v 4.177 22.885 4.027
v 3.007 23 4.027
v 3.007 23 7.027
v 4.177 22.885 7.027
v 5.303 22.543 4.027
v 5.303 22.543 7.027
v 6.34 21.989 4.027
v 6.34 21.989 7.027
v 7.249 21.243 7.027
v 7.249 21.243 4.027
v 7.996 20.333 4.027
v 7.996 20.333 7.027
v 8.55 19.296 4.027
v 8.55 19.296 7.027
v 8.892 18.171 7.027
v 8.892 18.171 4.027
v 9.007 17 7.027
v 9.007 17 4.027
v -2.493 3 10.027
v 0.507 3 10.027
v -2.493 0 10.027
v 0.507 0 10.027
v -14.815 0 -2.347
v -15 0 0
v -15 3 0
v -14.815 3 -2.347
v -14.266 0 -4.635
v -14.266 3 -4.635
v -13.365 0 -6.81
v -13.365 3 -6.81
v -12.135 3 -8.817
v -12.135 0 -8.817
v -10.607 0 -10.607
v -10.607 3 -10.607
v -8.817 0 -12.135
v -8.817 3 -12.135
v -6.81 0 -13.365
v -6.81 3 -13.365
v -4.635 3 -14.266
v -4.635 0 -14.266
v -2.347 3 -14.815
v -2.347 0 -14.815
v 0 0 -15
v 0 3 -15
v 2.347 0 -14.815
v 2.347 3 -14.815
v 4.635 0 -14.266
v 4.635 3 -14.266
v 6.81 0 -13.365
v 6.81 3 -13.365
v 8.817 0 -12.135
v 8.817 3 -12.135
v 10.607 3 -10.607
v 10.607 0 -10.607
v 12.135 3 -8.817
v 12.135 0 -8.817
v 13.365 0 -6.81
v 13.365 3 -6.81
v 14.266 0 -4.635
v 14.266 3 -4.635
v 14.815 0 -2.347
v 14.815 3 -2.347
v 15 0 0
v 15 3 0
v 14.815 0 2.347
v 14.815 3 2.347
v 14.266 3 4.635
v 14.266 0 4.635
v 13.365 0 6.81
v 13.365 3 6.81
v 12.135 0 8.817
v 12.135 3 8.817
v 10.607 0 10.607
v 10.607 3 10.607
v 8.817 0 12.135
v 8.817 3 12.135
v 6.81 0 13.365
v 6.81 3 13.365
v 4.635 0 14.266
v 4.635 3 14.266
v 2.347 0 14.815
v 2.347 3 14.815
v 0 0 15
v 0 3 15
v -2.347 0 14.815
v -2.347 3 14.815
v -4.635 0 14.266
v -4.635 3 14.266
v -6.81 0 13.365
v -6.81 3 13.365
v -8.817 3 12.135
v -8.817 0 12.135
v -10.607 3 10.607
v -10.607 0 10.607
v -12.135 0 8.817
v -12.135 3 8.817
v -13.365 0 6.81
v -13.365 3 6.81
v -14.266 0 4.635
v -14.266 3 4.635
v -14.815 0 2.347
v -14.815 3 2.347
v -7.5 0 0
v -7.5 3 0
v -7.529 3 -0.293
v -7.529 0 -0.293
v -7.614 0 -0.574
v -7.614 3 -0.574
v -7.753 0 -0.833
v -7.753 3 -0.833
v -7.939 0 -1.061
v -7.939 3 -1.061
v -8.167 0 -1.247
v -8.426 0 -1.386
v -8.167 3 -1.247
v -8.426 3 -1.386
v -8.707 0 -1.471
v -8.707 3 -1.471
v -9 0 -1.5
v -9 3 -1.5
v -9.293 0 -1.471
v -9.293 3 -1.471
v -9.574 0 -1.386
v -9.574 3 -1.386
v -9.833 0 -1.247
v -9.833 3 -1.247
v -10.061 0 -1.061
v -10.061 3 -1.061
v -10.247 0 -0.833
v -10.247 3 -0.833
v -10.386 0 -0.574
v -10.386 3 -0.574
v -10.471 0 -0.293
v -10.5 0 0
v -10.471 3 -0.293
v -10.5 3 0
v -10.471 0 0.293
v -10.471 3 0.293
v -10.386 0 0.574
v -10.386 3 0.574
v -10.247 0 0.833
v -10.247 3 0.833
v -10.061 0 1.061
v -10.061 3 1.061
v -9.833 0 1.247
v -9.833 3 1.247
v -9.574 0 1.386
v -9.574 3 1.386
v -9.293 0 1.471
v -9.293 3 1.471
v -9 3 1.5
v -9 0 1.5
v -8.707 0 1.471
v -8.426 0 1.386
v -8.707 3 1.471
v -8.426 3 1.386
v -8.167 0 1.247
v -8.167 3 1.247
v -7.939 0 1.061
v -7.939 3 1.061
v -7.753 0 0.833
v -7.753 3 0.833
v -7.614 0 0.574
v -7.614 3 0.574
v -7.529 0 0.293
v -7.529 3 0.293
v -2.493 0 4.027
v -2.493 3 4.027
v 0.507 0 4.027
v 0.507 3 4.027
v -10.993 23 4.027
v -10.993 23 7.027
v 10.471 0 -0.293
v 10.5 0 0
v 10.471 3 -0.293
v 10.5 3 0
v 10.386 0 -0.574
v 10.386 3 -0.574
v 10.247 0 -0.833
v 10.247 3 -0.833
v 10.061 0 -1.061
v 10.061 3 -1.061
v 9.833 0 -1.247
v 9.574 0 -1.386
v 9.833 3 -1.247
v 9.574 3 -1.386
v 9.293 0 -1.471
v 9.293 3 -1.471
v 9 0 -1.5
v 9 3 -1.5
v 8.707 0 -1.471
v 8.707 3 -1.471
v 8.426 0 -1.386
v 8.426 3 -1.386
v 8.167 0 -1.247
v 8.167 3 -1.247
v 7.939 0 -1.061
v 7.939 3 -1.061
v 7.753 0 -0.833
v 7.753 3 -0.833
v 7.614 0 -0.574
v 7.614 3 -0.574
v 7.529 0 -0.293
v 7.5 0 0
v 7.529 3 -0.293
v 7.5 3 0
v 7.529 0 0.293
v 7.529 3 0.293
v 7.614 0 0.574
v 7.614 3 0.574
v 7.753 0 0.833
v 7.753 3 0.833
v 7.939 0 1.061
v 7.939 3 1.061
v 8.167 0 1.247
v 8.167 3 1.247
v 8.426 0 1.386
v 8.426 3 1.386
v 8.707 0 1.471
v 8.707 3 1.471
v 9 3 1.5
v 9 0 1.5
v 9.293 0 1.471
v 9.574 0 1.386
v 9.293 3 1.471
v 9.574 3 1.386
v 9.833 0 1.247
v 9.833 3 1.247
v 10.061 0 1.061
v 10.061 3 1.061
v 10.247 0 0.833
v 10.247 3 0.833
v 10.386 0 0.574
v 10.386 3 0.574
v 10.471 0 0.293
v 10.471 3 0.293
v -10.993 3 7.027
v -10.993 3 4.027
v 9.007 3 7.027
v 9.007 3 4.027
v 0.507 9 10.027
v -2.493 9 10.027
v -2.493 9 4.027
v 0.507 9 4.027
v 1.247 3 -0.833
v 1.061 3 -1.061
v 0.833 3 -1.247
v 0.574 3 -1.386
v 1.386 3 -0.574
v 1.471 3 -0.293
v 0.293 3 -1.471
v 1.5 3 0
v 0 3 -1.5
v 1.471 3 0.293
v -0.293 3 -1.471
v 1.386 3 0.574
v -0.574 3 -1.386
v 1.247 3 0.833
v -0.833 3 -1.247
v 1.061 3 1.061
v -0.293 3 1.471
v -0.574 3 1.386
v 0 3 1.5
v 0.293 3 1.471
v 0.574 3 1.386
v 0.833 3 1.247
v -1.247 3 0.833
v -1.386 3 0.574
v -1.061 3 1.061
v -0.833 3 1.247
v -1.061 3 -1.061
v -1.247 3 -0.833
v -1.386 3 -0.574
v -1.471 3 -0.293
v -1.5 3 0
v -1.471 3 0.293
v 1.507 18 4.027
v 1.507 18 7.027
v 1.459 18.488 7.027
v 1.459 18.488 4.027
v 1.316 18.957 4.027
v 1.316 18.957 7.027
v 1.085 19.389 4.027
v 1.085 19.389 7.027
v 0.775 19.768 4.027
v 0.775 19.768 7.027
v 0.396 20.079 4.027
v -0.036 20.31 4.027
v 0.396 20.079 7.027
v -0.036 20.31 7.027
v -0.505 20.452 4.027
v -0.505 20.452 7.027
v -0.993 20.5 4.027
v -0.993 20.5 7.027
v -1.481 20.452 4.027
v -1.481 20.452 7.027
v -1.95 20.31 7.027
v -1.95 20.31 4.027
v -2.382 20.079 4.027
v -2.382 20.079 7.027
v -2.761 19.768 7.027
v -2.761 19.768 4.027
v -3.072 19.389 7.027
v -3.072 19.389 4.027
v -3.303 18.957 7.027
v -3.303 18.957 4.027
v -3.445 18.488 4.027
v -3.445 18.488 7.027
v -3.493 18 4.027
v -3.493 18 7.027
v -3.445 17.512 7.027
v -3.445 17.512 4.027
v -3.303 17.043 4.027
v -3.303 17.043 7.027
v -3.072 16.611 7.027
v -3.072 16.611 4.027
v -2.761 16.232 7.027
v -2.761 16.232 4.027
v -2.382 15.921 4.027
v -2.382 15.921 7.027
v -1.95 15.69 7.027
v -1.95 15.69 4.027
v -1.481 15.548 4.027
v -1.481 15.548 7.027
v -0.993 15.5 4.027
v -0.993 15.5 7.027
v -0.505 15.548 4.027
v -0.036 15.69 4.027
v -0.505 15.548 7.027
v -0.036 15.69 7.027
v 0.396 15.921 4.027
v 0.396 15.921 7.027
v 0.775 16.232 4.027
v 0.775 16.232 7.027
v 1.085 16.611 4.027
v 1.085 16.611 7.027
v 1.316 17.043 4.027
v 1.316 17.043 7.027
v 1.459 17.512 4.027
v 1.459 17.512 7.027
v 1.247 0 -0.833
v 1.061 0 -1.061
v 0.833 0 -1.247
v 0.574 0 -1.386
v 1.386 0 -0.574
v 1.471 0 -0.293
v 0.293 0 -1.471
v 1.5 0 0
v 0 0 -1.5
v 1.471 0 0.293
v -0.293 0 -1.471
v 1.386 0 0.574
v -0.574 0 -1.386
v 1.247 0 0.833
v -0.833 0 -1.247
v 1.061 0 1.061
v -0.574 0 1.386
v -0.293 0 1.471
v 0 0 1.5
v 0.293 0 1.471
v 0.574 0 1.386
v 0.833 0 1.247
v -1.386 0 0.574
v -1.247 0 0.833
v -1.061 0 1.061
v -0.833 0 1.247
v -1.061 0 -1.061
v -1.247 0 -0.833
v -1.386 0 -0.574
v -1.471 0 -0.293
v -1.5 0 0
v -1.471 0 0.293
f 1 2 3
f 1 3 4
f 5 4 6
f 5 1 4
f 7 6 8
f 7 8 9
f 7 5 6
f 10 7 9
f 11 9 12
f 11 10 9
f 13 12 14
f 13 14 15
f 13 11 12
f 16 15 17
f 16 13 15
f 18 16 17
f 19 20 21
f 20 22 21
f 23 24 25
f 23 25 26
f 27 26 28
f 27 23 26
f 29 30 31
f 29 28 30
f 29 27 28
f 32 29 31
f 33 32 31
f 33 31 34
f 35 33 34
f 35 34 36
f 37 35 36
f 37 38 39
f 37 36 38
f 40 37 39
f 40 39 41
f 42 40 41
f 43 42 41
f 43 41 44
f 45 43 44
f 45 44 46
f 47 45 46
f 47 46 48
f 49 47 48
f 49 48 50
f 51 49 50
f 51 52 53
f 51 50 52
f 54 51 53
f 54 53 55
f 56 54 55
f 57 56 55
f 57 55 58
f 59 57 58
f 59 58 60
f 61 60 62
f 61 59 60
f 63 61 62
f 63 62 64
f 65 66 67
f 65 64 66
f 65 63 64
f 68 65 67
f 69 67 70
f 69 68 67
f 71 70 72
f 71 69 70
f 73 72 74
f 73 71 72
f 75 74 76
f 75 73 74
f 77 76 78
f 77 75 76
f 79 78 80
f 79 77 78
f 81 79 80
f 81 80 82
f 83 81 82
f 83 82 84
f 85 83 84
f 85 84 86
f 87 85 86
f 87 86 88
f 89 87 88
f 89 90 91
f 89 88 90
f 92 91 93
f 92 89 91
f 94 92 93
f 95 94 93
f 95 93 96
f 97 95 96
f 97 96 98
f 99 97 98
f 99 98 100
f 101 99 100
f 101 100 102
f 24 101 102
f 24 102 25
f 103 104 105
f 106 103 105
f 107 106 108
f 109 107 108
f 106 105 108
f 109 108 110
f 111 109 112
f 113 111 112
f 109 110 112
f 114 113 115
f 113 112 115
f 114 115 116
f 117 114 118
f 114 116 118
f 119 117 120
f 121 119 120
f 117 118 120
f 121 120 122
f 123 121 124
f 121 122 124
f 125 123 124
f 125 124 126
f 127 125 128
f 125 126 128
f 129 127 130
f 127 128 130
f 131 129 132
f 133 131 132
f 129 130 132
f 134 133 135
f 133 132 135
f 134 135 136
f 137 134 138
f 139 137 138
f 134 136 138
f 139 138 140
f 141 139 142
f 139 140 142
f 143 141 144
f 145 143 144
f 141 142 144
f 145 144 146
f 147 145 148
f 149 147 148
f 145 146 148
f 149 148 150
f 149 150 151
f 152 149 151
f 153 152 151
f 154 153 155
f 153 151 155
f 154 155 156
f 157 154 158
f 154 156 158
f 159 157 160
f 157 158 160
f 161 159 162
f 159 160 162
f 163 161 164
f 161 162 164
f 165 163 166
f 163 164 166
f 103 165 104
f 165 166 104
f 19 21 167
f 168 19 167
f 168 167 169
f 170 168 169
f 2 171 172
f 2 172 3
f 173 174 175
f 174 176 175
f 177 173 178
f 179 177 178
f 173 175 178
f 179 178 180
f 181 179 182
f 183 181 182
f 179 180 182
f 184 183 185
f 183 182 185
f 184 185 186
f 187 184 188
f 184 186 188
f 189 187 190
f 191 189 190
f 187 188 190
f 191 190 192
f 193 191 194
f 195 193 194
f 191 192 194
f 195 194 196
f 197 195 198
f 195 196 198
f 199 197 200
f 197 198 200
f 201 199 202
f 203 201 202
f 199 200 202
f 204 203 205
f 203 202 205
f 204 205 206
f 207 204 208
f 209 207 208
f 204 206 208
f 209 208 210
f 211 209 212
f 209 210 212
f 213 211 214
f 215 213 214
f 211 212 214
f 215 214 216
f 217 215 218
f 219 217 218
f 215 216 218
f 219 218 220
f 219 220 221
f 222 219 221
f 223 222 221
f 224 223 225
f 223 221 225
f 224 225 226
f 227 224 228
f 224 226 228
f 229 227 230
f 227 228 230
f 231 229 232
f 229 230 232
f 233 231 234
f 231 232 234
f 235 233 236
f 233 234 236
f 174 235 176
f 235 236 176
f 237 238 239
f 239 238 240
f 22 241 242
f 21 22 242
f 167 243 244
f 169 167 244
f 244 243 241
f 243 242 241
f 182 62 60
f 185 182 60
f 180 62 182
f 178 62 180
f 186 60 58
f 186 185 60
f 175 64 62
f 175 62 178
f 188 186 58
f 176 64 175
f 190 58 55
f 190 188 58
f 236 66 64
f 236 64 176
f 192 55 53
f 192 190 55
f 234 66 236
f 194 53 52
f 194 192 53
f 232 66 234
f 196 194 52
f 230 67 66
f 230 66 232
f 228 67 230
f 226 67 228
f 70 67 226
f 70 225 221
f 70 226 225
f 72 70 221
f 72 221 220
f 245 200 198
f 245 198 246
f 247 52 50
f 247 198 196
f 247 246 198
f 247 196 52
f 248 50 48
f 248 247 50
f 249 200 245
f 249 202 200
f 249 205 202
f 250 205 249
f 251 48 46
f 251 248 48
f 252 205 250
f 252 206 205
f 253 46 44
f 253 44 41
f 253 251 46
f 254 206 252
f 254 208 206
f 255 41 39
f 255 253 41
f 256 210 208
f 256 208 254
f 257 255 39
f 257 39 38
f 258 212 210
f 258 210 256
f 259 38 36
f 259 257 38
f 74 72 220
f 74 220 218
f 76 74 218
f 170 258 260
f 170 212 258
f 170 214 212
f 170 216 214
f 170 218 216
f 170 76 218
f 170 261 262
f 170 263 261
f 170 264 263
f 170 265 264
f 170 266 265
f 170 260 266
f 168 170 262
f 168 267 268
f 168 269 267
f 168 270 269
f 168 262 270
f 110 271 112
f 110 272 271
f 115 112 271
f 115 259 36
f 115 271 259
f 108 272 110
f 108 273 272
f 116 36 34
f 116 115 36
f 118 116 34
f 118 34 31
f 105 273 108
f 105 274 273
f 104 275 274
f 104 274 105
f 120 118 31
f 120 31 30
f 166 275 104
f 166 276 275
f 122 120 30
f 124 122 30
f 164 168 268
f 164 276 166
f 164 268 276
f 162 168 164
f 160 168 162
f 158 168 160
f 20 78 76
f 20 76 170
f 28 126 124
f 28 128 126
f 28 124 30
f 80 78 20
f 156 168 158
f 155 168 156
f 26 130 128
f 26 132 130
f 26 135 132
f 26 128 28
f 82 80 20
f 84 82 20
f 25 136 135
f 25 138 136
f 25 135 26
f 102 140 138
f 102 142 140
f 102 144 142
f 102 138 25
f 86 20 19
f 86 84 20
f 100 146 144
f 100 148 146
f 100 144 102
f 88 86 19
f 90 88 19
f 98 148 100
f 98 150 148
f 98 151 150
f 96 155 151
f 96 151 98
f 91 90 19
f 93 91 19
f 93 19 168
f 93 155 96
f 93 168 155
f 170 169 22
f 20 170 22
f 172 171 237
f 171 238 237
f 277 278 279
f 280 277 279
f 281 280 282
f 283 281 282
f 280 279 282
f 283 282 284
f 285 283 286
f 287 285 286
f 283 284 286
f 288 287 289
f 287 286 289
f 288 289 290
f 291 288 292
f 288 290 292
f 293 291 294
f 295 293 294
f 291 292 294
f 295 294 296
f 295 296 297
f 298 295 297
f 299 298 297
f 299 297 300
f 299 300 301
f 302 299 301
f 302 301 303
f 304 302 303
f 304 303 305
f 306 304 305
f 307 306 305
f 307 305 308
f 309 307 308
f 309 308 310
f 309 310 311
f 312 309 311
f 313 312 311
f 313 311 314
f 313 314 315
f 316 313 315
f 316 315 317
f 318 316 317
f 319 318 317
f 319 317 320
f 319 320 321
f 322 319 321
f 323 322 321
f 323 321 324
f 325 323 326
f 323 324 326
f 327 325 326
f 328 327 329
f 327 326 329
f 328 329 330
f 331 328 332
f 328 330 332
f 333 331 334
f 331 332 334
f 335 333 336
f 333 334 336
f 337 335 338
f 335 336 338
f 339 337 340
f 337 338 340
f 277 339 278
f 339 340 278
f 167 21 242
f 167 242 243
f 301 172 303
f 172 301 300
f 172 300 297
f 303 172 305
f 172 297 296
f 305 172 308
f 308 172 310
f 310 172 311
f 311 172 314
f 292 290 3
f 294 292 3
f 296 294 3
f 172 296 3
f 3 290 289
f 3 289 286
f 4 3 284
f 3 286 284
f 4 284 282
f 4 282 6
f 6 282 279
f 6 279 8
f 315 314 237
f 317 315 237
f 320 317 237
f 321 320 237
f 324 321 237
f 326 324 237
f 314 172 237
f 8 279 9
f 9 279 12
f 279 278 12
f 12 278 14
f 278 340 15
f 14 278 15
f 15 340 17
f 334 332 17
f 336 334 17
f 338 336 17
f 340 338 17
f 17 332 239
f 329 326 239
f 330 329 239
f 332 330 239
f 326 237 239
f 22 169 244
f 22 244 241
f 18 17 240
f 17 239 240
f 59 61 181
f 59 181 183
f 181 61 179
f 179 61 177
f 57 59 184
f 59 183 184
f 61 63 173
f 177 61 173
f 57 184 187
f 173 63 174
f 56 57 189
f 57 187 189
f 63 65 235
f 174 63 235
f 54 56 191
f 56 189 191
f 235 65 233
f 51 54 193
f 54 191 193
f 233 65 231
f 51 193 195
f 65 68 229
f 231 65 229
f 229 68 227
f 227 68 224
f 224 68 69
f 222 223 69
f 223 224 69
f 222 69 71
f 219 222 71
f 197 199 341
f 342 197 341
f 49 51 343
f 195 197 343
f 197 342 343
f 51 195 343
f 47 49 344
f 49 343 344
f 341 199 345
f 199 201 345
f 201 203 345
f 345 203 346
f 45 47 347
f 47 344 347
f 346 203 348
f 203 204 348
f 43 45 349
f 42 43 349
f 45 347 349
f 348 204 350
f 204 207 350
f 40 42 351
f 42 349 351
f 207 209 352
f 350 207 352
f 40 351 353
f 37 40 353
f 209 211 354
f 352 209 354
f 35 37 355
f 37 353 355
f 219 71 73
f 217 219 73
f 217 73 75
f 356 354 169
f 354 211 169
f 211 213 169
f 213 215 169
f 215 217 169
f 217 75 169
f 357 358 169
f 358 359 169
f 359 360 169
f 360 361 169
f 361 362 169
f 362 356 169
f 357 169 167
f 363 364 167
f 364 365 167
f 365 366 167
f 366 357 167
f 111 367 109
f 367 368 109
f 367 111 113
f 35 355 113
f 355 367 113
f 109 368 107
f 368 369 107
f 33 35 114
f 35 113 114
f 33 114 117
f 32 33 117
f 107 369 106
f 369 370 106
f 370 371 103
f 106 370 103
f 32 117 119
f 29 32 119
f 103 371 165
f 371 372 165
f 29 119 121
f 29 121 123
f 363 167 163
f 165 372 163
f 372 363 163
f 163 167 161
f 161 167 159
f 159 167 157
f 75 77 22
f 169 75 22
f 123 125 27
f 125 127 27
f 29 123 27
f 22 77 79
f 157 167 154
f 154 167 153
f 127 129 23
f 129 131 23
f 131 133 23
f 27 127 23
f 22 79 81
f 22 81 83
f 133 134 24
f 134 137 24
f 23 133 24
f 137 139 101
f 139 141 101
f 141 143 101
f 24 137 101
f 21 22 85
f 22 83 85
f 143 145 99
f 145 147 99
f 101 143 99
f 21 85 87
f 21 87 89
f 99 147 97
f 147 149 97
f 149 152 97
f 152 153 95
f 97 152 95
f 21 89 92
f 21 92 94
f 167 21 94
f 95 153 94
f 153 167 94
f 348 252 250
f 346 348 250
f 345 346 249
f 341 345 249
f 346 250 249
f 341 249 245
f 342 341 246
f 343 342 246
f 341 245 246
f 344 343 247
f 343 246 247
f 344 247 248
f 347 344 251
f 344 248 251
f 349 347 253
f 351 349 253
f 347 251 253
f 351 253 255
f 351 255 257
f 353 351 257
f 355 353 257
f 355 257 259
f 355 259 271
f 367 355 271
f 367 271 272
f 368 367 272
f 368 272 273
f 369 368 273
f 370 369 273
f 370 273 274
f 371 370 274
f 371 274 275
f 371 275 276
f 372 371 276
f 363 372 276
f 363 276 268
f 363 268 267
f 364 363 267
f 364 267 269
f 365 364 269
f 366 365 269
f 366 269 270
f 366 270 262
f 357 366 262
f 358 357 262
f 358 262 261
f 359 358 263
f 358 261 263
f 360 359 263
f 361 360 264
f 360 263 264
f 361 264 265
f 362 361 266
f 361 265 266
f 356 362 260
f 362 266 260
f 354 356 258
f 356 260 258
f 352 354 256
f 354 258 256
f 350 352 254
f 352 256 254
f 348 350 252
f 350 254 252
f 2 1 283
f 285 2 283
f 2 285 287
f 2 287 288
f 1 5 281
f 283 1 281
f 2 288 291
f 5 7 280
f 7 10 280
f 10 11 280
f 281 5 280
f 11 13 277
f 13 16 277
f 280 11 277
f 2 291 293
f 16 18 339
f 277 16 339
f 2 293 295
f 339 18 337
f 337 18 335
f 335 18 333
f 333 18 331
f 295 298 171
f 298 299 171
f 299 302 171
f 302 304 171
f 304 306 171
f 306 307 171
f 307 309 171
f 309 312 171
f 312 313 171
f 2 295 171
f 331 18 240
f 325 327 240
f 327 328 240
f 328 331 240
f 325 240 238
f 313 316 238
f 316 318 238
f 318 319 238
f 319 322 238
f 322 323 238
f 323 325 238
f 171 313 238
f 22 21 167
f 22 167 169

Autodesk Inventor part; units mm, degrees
ref_plane "YZ Plane" through (0, 0, 0) normal (1, 0, 0) x (0, 1, 0)
ref_plane "XZ Plane" through (0, 0, 0) normal (0, 1, 0) x (-1, 0, 0)
ref_plane "XY Plane" through (0, 0, 0) normal (0, 0, 1) x (1, 0, 0)
sketch "草圖1" plane through (0, 0, 0) normal (0, 1, 0) x (-1, 0, 0)
  circle A0 centre (0, 0) radius 15
  dimension "d0" = 30
extrude "擠出1" add sketch "草圖1" along normal blind 3
sketch "草圖2" plane through (0, 3, 0) normal (0, 1, 0) x (1, 0, 0)
  line L0 (-21, 0) -> (21, 0) construction
  circle A0 centre (-9, 0) radius 1.5
  circle A1 centre (0, 0) radius 1.5
  circle A2 centre (9, 0) radius 1.5
  dimension "d4" = 3
  dimension "d7" = 9
extrude "擠出2" cut sketch "草圖2" against normal up to surface (3 mm away)
sketch "草圖3" plane through (0, 3, 0) normal (0, 1, 0) x (1, 0, 0)
  line L0 (-10.9932, -7.0266) -> (9.0068, -7.0266)
  line L1 (9.0068, -7.0266) -> (9.0068, -4.0266)
  line L2 (9.0068, -4.0266) -> (-10.9932, -4.0266)
  line L3 (-10.9932, -4.0266) -> (-10.9932, -7.0266)
  point P0 (0, 0)
  dimension "d14" = 20
  dimension "d15" = 3
extrude "擠出3" add sketch "草圖3" along normal blind 20 separate body
sketch "草圖4" plane through (-10.9932, 3, 7.0266) normal (0, 0, 1) x (1, 0, 0)
  line L0 (20, 0) -> (0, 0) construction
  line L1 (20, 0) -> (20, 20) construction
  line L2 (0, 20) -> (20, 20) construction
  line L3 (0, 0) -> (0, 20) construction
  line L4 (0, 20) -> (10, 20) construction
  line L5 (10, 20) -> (10, 15) construction
  line L6 (10, 15) -> (0, 15) construction
  line L7 (0, 15) -> (0, 20) construction
  circle A0 centre (10, 15) radius 2.5
  point P0 (10.9932, -3)
  dimension "d18" = 15
  dimension "d19" = 5
extrude "擠出4" cut sketch "草圖4" against normal up to surface (3 mm away) bodies 2
sketch "草圖5" plane through (0, 0, 0) normal (0, -1, 0) x (1, 0, 0)
  line L0 (0.5068, 10.0266) -> (-2.4932, 10.0266)
  line L1 (-2.4932, 10.0266) -> (-2.4932, 4.0266)
  line L2 (-2.4932, 4.0266) -> (0.5068, 4.0266)
  line L3 (0.5068, 4.0266) -> (0.5068, 10.0266)
  line L4 (9.0068, 7.0266) -> (9.0068, 4.0266) projected
  line L5 (9.0068, 4.0266) -> (-10.9932, 4.0266) projected
  line L6 (-10.9932, 4.0266) -> (-10.9932, 7.0266) projected
  line L7 (-10.9932, 7.0266) -> (9.0068, 7.0266) projected
  point P0 (0, 0)
  point P1 (-0.9932, 4.0266)
  dimension "d22" = 6
extrude "擠出5" cut sketch "草圖5" against normal blind 9 contours L3 L7 L1 L0 | L3 L2 L1 L7 bodies 1
extrude "擠出6" add sketch "草圖5" against normal blind 9 separate body contours L3 L7 L1 L0 | L3 L2 L1 L7
fillet "圓角1" radius 6 1 edges at (9.0068, 23, 5.5266)
equation "\"d16\" = d14"
properties part number "Pad_1"
